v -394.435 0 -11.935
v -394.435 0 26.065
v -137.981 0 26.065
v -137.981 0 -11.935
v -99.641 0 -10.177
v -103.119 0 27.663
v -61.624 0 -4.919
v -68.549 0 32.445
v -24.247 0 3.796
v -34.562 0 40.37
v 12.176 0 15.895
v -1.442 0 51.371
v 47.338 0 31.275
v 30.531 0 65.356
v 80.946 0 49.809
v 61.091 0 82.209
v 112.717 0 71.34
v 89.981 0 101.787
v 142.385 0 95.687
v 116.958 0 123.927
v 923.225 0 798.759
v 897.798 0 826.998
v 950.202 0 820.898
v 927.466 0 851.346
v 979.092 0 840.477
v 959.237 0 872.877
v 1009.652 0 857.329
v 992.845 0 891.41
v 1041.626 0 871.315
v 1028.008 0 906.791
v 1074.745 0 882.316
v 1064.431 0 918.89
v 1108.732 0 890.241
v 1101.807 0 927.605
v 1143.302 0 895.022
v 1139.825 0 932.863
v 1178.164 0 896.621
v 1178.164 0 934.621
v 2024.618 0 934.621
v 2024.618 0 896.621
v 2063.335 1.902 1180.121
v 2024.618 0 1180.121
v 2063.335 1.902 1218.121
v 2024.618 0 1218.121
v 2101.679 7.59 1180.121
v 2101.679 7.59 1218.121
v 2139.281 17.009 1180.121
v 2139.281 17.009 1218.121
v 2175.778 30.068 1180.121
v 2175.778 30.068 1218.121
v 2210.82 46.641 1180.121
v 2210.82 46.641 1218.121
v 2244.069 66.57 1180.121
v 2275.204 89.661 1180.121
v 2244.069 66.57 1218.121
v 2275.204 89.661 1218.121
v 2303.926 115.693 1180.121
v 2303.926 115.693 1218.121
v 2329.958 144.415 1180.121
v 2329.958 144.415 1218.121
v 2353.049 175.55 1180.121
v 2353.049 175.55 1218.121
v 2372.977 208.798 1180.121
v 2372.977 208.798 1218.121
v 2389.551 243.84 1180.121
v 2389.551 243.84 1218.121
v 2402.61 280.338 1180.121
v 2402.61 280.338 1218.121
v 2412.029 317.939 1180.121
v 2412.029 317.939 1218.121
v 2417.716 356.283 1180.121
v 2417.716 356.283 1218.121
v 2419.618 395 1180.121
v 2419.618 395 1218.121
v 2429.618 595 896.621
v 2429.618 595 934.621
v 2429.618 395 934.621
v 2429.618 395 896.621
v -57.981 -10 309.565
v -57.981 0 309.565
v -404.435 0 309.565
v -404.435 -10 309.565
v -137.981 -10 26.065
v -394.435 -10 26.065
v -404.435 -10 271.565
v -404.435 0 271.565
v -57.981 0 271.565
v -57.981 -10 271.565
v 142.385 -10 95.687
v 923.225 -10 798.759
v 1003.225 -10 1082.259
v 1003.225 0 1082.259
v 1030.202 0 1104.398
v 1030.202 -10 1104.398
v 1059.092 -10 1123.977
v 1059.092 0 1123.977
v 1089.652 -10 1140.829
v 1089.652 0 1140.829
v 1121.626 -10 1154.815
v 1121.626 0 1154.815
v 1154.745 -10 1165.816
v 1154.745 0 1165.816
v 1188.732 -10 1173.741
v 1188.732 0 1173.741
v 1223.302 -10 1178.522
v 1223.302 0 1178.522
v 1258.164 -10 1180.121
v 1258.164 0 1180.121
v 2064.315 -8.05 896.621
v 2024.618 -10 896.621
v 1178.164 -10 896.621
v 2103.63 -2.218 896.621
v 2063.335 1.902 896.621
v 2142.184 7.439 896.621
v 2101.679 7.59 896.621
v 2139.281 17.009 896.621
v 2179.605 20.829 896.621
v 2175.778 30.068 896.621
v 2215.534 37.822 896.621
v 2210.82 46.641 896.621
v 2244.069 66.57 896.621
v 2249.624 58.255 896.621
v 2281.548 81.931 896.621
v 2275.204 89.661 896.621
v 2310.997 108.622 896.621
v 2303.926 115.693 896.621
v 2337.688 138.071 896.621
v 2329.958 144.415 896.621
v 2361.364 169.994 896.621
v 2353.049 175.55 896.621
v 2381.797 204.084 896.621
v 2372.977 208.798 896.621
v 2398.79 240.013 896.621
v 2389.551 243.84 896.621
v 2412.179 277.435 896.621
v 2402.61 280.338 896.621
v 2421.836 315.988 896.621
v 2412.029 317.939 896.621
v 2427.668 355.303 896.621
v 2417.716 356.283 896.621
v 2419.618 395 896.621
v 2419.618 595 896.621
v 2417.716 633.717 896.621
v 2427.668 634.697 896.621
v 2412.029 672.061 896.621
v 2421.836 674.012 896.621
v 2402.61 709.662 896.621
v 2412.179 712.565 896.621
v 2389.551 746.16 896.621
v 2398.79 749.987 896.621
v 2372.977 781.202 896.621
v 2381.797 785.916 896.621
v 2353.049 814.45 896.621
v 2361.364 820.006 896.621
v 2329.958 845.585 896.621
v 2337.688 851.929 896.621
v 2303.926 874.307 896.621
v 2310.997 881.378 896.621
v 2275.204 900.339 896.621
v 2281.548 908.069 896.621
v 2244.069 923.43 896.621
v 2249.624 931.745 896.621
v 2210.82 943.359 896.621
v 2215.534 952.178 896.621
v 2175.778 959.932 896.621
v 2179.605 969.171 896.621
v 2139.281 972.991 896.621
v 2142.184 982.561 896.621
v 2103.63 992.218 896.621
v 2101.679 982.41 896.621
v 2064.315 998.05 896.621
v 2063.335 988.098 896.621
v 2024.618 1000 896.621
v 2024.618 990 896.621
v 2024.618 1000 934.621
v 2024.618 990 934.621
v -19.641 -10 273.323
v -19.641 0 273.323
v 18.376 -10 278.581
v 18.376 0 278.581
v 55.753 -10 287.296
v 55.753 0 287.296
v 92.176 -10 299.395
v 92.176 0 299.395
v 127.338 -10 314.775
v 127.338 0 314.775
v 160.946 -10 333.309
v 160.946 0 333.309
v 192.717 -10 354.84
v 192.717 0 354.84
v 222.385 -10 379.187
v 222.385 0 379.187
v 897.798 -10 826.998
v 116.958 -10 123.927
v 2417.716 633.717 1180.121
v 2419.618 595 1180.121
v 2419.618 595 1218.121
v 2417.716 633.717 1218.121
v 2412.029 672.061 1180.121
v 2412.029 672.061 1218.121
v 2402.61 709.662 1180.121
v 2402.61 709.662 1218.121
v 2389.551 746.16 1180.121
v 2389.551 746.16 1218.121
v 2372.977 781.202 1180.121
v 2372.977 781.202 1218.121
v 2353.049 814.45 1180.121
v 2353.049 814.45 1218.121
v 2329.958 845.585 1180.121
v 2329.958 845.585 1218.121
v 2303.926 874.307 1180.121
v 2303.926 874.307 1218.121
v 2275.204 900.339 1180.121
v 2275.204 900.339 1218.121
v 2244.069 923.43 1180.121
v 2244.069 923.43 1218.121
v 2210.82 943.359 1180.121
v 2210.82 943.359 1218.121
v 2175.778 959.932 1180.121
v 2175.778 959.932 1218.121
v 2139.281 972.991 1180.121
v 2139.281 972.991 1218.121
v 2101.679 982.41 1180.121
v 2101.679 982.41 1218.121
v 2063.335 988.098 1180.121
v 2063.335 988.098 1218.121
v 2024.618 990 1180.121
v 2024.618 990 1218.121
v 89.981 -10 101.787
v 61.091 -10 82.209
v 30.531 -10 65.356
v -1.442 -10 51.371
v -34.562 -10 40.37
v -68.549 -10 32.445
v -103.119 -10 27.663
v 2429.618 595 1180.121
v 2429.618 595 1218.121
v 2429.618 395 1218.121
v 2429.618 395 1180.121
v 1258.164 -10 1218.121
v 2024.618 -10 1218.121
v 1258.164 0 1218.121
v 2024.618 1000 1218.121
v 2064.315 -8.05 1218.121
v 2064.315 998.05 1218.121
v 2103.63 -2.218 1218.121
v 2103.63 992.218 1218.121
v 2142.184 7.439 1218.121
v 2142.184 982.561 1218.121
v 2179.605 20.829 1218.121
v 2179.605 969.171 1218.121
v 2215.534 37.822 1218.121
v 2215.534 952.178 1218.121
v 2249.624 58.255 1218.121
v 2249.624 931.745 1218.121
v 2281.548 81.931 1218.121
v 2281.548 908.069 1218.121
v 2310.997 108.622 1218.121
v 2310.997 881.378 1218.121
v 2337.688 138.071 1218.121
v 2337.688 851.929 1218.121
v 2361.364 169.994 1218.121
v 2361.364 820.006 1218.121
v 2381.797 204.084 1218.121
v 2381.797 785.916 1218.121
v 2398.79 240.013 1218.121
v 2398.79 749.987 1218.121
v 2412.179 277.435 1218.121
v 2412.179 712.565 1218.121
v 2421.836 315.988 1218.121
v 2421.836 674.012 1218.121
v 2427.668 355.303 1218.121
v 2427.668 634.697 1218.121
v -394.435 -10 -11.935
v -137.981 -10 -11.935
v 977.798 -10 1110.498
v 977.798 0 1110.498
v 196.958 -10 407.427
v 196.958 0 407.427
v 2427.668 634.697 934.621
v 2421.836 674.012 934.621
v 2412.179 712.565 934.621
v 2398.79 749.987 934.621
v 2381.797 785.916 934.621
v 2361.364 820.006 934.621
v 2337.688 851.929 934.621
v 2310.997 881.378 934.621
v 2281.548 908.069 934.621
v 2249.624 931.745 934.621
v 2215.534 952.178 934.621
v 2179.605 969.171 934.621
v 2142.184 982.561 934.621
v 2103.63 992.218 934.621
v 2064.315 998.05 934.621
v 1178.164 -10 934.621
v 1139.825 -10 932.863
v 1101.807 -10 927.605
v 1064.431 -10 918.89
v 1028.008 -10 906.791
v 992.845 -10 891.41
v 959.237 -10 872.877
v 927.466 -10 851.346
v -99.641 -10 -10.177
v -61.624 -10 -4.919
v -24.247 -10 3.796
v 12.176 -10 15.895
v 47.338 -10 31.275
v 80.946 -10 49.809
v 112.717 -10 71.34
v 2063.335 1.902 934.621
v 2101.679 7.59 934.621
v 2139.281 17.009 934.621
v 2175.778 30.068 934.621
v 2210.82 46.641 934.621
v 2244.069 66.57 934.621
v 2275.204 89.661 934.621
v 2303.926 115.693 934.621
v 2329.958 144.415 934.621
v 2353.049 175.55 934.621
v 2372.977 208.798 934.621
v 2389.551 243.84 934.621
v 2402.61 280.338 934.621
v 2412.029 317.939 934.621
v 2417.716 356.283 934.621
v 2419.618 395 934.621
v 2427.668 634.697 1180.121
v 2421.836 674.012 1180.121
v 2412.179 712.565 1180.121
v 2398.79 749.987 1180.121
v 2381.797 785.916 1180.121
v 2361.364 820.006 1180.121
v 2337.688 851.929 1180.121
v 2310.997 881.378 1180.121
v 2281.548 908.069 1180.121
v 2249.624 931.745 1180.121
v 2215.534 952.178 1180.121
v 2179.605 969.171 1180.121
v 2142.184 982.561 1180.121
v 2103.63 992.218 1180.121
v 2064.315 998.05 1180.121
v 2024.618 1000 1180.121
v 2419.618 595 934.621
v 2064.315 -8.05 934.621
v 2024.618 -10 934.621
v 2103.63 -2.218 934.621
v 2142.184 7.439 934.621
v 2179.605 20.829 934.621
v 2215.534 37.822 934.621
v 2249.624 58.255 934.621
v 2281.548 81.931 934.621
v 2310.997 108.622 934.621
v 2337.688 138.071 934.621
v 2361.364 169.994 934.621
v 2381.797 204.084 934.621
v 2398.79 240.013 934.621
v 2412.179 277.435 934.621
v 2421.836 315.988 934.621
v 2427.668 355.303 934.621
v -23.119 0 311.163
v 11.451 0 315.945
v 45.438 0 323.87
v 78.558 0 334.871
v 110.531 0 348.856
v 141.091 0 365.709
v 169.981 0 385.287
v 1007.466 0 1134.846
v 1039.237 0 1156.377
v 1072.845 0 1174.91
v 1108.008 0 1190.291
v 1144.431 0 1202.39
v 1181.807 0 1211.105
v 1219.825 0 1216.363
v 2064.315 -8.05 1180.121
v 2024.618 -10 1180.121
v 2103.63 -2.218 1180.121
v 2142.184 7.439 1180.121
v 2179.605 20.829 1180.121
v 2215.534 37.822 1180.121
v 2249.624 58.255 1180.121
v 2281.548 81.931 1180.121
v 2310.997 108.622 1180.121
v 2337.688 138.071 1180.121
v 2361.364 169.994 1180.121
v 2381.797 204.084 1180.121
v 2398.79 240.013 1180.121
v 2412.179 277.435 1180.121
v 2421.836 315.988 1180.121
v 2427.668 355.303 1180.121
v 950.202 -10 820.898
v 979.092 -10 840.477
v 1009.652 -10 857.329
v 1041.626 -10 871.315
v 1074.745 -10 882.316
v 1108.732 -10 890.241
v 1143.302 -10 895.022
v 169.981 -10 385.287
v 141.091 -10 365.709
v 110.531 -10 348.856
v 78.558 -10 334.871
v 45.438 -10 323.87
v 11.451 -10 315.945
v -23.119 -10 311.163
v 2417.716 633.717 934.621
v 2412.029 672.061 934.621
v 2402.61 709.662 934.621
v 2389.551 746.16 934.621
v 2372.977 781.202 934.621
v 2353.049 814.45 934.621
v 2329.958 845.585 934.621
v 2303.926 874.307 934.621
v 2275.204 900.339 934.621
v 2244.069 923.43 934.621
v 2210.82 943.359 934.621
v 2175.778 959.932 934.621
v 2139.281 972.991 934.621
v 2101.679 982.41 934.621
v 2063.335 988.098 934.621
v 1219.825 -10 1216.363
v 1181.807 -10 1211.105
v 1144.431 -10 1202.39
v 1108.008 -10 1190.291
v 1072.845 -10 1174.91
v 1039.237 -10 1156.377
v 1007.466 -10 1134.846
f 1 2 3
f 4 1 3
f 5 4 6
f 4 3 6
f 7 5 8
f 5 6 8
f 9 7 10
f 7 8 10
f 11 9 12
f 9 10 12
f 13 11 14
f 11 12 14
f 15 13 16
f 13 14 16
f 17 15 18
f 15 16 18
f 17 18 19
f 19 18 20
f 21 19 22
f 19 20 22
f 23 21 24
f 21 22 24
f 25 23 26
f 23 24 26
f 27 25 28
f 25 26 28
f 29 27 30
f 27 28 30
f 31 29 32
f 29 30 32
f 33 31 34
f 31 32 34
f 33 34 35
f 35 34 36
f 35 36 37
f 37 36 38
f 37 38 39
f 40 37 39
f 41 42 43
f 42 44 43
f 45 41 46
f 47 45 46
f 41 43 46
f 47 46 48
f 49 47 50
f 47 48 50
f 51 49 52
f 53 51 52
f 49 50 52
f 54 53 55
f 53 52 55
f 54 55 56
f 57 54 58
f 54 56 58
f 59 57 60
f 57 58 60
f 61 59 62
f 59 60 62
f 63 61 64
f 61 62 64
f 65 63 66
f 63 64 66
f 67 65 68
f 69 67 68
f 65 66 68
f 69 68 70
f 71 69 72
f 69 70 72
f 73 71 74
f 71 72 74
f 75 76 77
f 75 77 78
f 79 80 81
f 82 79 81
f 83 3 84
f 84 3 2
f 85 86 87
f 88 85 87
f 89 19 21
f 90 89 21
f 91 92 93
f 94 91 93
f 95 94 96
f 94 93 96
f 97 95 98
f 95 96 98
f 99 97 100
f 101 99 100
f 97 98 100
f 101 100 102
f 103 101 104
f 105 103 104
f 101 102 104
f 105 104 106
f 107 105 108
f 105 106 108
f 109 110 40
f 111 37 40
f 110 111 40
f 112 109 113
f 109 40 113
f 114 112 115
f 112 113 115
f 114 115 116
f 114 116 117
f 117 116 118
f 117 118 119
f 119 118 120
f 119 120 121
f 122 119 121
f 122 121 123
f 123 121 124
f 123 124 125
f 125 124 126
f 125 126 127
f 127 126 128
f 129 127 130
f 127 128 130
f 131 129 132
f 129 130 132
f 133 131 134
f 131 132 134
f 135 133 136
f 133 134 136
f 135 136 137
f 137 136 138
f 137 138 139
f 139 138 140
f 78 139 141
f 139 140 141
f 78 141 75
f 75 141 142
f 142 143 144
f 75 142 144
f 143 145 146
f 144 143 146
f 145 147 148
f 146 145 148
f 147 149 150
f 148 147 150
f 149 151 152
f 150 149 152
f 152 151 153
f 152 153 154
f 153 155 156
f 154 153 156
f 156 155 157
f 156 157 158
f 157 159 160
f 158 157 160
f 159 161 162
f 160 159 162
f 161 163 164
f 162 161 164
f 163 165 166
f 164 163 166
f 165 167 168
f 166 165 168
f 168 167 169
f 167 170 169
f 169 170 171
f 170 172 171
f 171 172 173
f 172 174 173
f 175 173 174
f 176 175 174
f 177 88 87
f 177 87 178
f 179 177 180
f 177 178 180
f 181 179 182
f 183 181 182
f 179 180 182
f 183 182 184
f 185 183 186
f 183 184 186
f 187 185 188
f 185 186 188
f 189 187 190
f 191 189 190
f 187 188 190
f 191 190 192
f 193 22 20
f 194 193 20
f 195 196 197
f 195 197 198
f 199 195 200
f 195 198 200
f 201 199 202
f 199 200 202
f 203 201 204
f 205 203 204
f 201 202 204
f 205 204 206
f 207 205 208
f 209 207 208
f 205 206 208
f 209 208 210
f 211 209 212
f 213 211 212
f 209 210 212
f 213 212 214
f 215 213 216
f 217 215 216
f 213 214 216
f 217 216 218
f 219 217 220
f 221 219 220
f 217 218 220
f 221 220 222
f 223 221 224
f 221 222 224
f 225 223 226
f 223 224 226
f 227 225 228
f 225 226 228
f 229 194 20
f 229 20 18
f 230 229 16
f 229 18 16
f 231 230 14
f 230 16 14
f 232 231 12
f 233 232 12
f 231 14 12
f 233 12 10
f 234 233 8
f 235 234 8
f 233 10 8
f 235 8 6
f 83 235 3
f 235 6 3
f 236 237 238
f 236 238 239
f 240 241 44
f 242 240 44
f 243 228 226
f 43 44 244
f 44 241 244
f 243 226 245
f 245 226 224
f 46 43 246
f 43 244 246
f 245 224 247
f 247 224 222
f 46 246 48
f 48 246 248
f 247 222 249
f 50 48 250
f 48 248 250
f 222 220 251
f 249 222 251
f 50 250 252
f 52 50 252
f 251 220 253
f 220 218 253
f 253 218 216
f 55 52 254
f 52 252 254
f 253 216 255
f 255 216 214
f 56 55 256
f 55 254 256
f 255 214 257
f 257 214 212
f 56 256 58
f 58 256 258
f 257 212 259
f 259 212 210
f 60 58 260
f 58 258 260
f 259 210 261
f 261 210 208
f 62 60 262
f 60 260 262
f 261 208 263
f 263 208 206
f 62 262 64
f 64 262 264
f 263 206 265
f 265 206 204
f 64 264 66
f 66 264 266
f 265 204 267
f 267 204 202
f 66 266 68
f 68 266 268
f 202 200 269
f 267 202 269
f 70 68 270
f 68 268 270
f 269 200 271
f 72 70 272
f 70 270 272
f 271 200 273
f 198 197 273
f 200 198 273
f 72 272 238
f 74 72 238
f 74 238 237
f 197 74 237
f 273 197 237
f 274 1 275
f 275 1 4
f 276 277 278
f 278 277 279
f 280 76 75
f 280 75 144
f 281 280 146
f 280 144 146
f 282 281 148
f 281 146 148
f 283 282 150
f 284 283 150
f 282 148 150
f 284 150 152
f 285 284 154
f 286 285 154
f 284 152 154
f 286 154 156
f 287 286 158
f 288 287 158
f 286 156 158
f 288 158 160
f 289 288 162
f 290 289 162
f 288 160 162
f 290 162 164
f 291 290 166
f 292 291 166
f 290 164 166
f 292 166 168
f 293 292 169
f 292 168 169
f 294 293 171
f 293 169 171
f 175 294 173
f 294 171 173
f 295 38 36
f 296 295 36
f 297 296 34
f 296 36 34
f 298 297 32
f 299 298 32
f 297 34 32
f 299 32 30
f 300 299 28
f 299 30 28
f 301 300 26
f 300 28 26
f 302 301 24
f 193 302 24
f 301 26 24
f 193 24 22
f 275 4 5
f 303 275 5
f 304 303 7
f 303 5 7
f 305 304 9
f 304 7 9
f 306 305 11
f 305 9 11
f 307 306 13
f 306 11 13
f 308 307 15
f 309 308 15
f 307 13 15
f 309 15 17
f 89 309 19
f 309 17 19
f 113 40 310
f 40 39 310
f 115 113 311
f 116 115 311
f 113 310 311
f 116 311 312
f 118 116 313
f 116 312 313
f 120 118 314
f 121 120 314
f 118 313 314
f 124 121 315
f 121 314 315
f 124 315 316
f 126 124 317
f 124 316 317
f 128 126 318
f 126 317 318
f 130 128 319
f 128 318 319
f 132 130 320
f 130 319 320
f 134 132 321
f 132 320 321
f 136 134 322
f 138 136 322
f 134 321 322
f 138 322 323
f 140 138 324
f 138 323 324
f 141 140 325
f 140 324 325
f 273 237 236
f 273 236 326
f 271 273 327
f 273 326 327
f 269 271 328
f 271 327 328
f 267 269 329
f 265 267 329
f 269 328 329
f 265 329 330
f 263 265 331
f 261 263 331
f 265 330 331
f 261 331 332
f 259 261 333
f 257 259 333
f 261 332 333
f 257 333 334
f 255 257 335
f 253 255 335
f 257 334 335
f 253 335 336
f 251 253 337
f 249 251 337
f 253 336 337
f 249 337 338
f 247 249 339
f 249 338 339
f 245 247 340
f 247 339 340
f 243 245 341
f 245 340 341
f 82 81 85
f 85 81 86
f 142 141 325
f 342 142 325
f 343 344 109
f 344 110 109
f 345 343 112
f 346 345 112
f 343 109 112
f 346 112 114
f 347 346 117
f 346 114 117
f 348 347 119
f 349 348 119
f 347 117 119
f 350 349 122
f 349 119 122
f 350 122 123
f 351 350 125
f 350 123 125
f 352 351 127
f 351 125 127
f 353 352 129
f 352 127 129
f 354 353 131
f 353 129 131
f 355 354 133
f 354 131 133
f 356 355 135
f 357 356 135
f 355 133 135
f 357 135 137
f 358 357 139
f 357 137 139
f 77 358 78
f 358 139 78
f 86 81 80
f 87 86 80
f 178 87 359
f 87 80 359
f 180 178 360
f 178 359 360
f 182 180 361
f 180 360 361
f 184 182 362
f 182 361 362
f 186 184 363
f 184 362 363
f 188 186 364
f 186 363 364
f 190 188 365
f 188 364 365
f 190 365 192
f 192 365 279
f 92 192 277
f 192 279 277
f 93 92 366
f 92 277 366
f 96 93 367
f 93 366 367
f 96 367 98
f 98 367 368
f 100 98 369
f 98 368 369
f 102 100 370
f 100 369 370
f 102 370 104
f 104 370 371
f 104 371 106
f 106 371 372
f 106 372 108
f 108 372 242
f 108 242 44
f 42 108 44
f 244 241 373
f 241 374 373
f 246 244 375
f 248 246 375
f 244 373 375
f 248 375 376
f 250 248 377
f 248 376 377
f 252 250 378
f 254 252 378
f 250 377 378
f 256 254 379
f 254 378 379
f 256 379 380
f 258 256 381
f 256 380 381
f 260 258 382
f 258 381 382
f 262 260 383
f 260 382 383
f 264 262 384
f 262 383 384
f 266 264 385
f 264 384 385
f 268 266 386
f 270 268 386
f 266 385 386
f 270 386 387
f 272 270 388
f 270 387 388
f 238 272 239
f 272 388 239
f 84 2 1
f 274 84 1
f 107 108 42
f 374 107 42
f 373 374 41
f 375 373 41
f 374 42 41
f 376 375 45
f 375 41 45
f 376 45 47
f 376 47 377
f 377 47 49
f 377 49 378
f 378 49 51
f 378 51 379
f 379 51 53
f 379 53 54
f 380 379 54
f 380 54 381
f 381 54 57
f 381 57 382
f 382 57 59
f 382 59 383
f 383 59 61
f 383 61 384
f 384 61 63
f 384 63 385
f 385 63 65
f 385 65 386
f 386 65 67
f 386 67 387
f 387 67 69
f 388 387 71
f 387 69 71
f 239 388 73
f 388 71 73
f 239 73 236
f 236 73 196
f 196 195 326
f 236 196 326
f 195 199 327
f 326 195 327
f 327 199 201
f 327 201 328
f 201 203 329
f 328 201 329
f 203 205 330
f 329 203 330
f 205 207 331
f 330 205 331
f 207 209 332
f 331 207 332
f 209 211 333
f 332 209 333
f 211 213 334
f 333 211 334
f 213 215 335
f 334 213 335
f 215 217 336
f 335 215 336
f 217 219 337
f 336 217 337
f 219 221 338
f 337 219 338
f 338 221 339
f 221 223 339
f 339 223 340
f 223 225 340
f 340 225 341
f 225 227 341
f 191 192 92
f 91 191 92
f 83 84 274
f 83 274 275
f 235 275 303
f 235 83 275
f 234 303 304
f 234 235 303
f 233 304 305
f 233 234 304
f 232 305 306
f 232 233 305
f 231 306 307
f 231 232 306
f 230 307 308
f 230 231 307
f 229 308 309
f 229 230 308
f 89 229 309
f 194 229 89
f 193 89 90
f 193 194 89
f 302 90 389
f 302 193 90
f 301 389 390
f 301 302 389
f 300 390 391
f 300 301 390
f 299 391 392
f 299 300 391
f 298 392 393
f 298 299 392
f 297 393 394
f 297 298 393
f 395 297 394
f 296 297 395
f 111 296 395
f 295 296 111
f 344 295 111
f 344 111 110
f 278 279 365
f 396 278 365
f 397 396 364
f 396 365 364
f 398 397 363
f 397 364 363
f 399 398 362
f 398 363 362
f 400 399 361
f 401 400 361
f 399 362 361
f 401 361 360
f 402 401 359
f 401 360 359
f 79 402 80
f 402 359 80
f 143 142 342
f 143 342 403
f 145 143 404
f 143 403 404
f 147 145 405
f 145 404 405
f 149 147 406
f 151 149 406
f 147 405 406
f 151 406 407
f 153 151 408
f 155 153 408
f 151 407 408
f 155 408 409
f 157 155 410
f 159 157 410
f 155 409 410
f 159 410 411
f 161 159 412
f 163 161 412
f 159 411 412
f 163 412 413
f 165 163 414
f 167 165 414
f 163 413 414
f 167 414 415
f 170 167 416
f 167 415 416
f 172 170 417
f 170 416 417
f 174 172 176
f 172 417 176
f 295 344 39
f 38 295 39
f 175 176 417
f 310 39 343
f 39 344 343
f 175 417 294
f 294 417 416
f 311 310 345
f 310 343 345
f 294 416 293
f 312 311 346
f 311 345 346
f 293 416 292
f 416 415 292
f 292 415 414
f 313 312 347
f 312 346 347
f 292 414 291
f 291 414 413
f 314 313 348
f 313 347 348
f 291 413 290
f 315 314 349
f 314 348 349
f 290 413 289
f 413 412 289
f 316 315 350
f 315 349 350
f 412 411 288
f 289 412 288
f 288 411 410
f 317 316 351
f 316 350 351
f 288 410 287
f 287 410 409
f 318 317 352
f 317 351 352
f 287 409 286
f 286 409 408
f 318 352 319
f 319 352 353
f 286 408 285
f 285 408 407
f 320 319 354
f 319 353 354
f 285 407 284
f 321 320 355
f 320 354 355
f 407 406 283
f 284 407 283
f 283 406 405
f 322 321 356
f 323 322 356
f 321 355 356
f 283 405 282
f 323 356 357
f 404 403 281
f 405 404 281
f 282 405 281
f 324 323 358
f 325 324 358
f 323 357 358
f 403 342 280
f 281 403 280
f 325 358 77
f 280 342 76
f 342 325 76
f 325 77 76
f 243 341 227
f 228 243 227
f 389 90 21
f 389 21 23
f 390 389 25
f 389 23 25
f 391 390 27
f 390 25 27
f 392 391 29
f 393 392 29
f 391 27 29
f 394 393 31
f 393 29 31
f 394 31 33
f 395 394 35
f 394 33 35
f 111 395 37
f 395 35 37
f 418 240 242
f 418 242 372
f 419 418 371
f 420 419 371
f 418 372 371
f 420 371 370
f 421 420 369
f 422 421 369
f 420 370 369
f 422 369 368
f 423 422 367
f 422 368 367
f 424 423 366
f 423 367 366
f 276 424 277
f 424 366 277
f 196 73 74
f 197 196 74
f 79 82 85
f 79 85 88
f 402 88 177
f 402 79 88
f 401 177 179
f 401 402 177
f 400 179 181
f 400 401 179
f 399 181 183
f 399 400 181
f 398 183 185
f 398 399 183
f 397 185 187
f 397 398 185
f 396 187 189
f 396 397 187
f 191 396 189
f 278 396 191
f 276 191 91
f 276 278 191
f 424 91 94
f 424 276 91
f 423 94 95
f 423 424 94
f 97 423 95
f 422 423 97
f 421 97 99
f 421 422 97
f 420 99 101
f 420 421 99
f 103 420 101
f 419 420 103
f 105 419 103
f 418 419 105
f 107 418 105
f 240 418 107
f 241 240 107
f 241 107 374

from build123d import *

# Parameters (mm, degrees)
F1_DEPTH   = 10
F1_FACE1_W = 10
F1_FACE1_H = 38


with BuildPart() as f1:
    # F0 (on Front) → F1 (new body)
    with BuildSketch(Plane.XZ):
        with BuildLine():
            Line((-404.4350288425, 309.5649711575), (-404.4350288425, 271.5649711575))
            Line((-404.4350288425, 271.5649711575), (-57.9806428567, 271.5649711575))
            ThreePointArc((-57.9806428567, 271.5649711575), (92.1755280028, 299.3947724551), (222.3850812077, 379.1872892824))
            Line((222.3850812077, 379.1872892824), (1003.2252882849, 1082.2589696852))
            ThreePointArc((1003.2252882849, 1082.2589696852), (1121.6258605309, 1154.8149336737), (1258.1640493077, 1180.1207911783))
            Line((1258.1640493077, 1180.1207911783), (2024.6184352935, 1180.1207911783))
            Line((2024.6184352935, 1180.1207911783), (2024.6184352935, 1218.1207911783))
            Line((2024.6184352935, 1218.1207911783), (1258.1640493077, 1218.1207911783))
            ThreePointArc((1258.1640493077, 1218.1207911783), (1108.0078784482, 1190.2909898806), (977.7983252433, 1110.4984730533))
            Line((977.7983252433, 1110.4984730533), (196.958118166, 407.4267926506))
            ThreePointArc((196.958118166, 407.4267926506), (78.55754592, 334.870828662), (-57.9806428567, 309.5649711575))
            Line((-57.9806428567, 309.5649711575), (-404.4350288425, 309.5649711575))
        make_face()
    extrude(amount=F1_DEPTH)

    # F3: sweep along a path in F2
    with BuildLine(Plane.XY.offset(1218.1207911783)) as f3_path:
        ThreePointArc((2024.6184352935, -5), (2307.4611477681, 112.1572875254), (2424.6184352935, 395))
        Line((2424.6184352935, 395), (2424.6184352935, 595))
        ThreePointArc((2424.6184352935, 595), (2307.4611477681, 877.8427124746), (2024.6184352935, 995))
    # F1_face1 (on face) → F3 (sweep)
    with BuildSketch(Plane(origin=(2024.6184352935, -5, 1199.1207911783), x_dir=(0, 1, 0), z_dir=(1, 0, 0))):
        Rectangle(F1_FACE1_W, F1_FACE1_H)
    sweep(path=f3_path.line)


with BuildPart() as f1b:
    # F0 (on Front) → F1, piece 2 (new body)
    with BuildSketch(Plane.XZ):
        with BuildLine():
            Line((-137.9806428567, 26.0649711575), (-394.4350288425, 26.0649711575))
            Line((-394.4350288425, 26.0649711575), (-394.4350288425, -11.9350288425))
            Line((-394.4350288425, -11.9350288425), (-137.9806428567, -11.9350288425))
            ThreePointArc((-137.9806428567, -11.9350288425), (12.1755280028, 15.8947724551), (142.3850812077, 95.6872892824))
            Line((142.3850812077, 95.6872892824), (923.2252882849, 798.7589696852))
            ThreePointArc((923.2252882849, 798.7589696852), (1041.6258605309, 871.3149336737), (1178.1640493077, 896.6207911783))
            Line((1178.1640493077, 896.6207911783), (2024.6184352935, 896.6207911783))
            Line((2024.6184352935, 896.6207911783), (2024.6184352935, 934.6207911783))
            Line((2024.6184352935, 934.6207911783), (1178.1640493077, 934.6207911783))
            ThreePointArc((1178.1640493077, 934.6207911783), (1028.0078784482, 906.7909898806), (897.7983252433, 826.9984730533))
            Line((897.7983252433, 826.9984730533), (116.958118166, 123.9267926506))
            ThreePointArc((116.958118166, 123.9267926506), (-1.44245408, 51.370828662), (-137.9806428567, 26.0649711575))
        make_face()
    extrude(amount=F1_DEPTH)

    # F5: sweep along a path in F4
    with BuildLine(Plane(origin=(0, 0, 896.6207911783), x_dir=(1, 0, 0), z_dir=(0, 0, -1))) as f5_path:
        ThreePointArc((2024.6184352935, 5), (2307.4611477681, -112.1572875254), (2424.6184352935, -395))
        Line((2424.6184352935, -395), (2424.6184352935, -595))
        ThreePointArc((2424.6184352935, -595), (2307.4611477681, -877.8427124746), (2024.6184352935, -995))
    # F1_face1 (on face) → F5 (sweep)
    with BuildSketch(Plane(origin=(2024.6184352935, -5, 1199.1207911783), x_dir=(0, 1, 0), z_dir=(1, 0, 0))):
        with Locations((0, -283.5)):
            Rectangle(F1_FACE1_W, F1_FACE1_H)
    sweep(path=f5_path.line)


solid = Compound([f1.part, f1b.part])
